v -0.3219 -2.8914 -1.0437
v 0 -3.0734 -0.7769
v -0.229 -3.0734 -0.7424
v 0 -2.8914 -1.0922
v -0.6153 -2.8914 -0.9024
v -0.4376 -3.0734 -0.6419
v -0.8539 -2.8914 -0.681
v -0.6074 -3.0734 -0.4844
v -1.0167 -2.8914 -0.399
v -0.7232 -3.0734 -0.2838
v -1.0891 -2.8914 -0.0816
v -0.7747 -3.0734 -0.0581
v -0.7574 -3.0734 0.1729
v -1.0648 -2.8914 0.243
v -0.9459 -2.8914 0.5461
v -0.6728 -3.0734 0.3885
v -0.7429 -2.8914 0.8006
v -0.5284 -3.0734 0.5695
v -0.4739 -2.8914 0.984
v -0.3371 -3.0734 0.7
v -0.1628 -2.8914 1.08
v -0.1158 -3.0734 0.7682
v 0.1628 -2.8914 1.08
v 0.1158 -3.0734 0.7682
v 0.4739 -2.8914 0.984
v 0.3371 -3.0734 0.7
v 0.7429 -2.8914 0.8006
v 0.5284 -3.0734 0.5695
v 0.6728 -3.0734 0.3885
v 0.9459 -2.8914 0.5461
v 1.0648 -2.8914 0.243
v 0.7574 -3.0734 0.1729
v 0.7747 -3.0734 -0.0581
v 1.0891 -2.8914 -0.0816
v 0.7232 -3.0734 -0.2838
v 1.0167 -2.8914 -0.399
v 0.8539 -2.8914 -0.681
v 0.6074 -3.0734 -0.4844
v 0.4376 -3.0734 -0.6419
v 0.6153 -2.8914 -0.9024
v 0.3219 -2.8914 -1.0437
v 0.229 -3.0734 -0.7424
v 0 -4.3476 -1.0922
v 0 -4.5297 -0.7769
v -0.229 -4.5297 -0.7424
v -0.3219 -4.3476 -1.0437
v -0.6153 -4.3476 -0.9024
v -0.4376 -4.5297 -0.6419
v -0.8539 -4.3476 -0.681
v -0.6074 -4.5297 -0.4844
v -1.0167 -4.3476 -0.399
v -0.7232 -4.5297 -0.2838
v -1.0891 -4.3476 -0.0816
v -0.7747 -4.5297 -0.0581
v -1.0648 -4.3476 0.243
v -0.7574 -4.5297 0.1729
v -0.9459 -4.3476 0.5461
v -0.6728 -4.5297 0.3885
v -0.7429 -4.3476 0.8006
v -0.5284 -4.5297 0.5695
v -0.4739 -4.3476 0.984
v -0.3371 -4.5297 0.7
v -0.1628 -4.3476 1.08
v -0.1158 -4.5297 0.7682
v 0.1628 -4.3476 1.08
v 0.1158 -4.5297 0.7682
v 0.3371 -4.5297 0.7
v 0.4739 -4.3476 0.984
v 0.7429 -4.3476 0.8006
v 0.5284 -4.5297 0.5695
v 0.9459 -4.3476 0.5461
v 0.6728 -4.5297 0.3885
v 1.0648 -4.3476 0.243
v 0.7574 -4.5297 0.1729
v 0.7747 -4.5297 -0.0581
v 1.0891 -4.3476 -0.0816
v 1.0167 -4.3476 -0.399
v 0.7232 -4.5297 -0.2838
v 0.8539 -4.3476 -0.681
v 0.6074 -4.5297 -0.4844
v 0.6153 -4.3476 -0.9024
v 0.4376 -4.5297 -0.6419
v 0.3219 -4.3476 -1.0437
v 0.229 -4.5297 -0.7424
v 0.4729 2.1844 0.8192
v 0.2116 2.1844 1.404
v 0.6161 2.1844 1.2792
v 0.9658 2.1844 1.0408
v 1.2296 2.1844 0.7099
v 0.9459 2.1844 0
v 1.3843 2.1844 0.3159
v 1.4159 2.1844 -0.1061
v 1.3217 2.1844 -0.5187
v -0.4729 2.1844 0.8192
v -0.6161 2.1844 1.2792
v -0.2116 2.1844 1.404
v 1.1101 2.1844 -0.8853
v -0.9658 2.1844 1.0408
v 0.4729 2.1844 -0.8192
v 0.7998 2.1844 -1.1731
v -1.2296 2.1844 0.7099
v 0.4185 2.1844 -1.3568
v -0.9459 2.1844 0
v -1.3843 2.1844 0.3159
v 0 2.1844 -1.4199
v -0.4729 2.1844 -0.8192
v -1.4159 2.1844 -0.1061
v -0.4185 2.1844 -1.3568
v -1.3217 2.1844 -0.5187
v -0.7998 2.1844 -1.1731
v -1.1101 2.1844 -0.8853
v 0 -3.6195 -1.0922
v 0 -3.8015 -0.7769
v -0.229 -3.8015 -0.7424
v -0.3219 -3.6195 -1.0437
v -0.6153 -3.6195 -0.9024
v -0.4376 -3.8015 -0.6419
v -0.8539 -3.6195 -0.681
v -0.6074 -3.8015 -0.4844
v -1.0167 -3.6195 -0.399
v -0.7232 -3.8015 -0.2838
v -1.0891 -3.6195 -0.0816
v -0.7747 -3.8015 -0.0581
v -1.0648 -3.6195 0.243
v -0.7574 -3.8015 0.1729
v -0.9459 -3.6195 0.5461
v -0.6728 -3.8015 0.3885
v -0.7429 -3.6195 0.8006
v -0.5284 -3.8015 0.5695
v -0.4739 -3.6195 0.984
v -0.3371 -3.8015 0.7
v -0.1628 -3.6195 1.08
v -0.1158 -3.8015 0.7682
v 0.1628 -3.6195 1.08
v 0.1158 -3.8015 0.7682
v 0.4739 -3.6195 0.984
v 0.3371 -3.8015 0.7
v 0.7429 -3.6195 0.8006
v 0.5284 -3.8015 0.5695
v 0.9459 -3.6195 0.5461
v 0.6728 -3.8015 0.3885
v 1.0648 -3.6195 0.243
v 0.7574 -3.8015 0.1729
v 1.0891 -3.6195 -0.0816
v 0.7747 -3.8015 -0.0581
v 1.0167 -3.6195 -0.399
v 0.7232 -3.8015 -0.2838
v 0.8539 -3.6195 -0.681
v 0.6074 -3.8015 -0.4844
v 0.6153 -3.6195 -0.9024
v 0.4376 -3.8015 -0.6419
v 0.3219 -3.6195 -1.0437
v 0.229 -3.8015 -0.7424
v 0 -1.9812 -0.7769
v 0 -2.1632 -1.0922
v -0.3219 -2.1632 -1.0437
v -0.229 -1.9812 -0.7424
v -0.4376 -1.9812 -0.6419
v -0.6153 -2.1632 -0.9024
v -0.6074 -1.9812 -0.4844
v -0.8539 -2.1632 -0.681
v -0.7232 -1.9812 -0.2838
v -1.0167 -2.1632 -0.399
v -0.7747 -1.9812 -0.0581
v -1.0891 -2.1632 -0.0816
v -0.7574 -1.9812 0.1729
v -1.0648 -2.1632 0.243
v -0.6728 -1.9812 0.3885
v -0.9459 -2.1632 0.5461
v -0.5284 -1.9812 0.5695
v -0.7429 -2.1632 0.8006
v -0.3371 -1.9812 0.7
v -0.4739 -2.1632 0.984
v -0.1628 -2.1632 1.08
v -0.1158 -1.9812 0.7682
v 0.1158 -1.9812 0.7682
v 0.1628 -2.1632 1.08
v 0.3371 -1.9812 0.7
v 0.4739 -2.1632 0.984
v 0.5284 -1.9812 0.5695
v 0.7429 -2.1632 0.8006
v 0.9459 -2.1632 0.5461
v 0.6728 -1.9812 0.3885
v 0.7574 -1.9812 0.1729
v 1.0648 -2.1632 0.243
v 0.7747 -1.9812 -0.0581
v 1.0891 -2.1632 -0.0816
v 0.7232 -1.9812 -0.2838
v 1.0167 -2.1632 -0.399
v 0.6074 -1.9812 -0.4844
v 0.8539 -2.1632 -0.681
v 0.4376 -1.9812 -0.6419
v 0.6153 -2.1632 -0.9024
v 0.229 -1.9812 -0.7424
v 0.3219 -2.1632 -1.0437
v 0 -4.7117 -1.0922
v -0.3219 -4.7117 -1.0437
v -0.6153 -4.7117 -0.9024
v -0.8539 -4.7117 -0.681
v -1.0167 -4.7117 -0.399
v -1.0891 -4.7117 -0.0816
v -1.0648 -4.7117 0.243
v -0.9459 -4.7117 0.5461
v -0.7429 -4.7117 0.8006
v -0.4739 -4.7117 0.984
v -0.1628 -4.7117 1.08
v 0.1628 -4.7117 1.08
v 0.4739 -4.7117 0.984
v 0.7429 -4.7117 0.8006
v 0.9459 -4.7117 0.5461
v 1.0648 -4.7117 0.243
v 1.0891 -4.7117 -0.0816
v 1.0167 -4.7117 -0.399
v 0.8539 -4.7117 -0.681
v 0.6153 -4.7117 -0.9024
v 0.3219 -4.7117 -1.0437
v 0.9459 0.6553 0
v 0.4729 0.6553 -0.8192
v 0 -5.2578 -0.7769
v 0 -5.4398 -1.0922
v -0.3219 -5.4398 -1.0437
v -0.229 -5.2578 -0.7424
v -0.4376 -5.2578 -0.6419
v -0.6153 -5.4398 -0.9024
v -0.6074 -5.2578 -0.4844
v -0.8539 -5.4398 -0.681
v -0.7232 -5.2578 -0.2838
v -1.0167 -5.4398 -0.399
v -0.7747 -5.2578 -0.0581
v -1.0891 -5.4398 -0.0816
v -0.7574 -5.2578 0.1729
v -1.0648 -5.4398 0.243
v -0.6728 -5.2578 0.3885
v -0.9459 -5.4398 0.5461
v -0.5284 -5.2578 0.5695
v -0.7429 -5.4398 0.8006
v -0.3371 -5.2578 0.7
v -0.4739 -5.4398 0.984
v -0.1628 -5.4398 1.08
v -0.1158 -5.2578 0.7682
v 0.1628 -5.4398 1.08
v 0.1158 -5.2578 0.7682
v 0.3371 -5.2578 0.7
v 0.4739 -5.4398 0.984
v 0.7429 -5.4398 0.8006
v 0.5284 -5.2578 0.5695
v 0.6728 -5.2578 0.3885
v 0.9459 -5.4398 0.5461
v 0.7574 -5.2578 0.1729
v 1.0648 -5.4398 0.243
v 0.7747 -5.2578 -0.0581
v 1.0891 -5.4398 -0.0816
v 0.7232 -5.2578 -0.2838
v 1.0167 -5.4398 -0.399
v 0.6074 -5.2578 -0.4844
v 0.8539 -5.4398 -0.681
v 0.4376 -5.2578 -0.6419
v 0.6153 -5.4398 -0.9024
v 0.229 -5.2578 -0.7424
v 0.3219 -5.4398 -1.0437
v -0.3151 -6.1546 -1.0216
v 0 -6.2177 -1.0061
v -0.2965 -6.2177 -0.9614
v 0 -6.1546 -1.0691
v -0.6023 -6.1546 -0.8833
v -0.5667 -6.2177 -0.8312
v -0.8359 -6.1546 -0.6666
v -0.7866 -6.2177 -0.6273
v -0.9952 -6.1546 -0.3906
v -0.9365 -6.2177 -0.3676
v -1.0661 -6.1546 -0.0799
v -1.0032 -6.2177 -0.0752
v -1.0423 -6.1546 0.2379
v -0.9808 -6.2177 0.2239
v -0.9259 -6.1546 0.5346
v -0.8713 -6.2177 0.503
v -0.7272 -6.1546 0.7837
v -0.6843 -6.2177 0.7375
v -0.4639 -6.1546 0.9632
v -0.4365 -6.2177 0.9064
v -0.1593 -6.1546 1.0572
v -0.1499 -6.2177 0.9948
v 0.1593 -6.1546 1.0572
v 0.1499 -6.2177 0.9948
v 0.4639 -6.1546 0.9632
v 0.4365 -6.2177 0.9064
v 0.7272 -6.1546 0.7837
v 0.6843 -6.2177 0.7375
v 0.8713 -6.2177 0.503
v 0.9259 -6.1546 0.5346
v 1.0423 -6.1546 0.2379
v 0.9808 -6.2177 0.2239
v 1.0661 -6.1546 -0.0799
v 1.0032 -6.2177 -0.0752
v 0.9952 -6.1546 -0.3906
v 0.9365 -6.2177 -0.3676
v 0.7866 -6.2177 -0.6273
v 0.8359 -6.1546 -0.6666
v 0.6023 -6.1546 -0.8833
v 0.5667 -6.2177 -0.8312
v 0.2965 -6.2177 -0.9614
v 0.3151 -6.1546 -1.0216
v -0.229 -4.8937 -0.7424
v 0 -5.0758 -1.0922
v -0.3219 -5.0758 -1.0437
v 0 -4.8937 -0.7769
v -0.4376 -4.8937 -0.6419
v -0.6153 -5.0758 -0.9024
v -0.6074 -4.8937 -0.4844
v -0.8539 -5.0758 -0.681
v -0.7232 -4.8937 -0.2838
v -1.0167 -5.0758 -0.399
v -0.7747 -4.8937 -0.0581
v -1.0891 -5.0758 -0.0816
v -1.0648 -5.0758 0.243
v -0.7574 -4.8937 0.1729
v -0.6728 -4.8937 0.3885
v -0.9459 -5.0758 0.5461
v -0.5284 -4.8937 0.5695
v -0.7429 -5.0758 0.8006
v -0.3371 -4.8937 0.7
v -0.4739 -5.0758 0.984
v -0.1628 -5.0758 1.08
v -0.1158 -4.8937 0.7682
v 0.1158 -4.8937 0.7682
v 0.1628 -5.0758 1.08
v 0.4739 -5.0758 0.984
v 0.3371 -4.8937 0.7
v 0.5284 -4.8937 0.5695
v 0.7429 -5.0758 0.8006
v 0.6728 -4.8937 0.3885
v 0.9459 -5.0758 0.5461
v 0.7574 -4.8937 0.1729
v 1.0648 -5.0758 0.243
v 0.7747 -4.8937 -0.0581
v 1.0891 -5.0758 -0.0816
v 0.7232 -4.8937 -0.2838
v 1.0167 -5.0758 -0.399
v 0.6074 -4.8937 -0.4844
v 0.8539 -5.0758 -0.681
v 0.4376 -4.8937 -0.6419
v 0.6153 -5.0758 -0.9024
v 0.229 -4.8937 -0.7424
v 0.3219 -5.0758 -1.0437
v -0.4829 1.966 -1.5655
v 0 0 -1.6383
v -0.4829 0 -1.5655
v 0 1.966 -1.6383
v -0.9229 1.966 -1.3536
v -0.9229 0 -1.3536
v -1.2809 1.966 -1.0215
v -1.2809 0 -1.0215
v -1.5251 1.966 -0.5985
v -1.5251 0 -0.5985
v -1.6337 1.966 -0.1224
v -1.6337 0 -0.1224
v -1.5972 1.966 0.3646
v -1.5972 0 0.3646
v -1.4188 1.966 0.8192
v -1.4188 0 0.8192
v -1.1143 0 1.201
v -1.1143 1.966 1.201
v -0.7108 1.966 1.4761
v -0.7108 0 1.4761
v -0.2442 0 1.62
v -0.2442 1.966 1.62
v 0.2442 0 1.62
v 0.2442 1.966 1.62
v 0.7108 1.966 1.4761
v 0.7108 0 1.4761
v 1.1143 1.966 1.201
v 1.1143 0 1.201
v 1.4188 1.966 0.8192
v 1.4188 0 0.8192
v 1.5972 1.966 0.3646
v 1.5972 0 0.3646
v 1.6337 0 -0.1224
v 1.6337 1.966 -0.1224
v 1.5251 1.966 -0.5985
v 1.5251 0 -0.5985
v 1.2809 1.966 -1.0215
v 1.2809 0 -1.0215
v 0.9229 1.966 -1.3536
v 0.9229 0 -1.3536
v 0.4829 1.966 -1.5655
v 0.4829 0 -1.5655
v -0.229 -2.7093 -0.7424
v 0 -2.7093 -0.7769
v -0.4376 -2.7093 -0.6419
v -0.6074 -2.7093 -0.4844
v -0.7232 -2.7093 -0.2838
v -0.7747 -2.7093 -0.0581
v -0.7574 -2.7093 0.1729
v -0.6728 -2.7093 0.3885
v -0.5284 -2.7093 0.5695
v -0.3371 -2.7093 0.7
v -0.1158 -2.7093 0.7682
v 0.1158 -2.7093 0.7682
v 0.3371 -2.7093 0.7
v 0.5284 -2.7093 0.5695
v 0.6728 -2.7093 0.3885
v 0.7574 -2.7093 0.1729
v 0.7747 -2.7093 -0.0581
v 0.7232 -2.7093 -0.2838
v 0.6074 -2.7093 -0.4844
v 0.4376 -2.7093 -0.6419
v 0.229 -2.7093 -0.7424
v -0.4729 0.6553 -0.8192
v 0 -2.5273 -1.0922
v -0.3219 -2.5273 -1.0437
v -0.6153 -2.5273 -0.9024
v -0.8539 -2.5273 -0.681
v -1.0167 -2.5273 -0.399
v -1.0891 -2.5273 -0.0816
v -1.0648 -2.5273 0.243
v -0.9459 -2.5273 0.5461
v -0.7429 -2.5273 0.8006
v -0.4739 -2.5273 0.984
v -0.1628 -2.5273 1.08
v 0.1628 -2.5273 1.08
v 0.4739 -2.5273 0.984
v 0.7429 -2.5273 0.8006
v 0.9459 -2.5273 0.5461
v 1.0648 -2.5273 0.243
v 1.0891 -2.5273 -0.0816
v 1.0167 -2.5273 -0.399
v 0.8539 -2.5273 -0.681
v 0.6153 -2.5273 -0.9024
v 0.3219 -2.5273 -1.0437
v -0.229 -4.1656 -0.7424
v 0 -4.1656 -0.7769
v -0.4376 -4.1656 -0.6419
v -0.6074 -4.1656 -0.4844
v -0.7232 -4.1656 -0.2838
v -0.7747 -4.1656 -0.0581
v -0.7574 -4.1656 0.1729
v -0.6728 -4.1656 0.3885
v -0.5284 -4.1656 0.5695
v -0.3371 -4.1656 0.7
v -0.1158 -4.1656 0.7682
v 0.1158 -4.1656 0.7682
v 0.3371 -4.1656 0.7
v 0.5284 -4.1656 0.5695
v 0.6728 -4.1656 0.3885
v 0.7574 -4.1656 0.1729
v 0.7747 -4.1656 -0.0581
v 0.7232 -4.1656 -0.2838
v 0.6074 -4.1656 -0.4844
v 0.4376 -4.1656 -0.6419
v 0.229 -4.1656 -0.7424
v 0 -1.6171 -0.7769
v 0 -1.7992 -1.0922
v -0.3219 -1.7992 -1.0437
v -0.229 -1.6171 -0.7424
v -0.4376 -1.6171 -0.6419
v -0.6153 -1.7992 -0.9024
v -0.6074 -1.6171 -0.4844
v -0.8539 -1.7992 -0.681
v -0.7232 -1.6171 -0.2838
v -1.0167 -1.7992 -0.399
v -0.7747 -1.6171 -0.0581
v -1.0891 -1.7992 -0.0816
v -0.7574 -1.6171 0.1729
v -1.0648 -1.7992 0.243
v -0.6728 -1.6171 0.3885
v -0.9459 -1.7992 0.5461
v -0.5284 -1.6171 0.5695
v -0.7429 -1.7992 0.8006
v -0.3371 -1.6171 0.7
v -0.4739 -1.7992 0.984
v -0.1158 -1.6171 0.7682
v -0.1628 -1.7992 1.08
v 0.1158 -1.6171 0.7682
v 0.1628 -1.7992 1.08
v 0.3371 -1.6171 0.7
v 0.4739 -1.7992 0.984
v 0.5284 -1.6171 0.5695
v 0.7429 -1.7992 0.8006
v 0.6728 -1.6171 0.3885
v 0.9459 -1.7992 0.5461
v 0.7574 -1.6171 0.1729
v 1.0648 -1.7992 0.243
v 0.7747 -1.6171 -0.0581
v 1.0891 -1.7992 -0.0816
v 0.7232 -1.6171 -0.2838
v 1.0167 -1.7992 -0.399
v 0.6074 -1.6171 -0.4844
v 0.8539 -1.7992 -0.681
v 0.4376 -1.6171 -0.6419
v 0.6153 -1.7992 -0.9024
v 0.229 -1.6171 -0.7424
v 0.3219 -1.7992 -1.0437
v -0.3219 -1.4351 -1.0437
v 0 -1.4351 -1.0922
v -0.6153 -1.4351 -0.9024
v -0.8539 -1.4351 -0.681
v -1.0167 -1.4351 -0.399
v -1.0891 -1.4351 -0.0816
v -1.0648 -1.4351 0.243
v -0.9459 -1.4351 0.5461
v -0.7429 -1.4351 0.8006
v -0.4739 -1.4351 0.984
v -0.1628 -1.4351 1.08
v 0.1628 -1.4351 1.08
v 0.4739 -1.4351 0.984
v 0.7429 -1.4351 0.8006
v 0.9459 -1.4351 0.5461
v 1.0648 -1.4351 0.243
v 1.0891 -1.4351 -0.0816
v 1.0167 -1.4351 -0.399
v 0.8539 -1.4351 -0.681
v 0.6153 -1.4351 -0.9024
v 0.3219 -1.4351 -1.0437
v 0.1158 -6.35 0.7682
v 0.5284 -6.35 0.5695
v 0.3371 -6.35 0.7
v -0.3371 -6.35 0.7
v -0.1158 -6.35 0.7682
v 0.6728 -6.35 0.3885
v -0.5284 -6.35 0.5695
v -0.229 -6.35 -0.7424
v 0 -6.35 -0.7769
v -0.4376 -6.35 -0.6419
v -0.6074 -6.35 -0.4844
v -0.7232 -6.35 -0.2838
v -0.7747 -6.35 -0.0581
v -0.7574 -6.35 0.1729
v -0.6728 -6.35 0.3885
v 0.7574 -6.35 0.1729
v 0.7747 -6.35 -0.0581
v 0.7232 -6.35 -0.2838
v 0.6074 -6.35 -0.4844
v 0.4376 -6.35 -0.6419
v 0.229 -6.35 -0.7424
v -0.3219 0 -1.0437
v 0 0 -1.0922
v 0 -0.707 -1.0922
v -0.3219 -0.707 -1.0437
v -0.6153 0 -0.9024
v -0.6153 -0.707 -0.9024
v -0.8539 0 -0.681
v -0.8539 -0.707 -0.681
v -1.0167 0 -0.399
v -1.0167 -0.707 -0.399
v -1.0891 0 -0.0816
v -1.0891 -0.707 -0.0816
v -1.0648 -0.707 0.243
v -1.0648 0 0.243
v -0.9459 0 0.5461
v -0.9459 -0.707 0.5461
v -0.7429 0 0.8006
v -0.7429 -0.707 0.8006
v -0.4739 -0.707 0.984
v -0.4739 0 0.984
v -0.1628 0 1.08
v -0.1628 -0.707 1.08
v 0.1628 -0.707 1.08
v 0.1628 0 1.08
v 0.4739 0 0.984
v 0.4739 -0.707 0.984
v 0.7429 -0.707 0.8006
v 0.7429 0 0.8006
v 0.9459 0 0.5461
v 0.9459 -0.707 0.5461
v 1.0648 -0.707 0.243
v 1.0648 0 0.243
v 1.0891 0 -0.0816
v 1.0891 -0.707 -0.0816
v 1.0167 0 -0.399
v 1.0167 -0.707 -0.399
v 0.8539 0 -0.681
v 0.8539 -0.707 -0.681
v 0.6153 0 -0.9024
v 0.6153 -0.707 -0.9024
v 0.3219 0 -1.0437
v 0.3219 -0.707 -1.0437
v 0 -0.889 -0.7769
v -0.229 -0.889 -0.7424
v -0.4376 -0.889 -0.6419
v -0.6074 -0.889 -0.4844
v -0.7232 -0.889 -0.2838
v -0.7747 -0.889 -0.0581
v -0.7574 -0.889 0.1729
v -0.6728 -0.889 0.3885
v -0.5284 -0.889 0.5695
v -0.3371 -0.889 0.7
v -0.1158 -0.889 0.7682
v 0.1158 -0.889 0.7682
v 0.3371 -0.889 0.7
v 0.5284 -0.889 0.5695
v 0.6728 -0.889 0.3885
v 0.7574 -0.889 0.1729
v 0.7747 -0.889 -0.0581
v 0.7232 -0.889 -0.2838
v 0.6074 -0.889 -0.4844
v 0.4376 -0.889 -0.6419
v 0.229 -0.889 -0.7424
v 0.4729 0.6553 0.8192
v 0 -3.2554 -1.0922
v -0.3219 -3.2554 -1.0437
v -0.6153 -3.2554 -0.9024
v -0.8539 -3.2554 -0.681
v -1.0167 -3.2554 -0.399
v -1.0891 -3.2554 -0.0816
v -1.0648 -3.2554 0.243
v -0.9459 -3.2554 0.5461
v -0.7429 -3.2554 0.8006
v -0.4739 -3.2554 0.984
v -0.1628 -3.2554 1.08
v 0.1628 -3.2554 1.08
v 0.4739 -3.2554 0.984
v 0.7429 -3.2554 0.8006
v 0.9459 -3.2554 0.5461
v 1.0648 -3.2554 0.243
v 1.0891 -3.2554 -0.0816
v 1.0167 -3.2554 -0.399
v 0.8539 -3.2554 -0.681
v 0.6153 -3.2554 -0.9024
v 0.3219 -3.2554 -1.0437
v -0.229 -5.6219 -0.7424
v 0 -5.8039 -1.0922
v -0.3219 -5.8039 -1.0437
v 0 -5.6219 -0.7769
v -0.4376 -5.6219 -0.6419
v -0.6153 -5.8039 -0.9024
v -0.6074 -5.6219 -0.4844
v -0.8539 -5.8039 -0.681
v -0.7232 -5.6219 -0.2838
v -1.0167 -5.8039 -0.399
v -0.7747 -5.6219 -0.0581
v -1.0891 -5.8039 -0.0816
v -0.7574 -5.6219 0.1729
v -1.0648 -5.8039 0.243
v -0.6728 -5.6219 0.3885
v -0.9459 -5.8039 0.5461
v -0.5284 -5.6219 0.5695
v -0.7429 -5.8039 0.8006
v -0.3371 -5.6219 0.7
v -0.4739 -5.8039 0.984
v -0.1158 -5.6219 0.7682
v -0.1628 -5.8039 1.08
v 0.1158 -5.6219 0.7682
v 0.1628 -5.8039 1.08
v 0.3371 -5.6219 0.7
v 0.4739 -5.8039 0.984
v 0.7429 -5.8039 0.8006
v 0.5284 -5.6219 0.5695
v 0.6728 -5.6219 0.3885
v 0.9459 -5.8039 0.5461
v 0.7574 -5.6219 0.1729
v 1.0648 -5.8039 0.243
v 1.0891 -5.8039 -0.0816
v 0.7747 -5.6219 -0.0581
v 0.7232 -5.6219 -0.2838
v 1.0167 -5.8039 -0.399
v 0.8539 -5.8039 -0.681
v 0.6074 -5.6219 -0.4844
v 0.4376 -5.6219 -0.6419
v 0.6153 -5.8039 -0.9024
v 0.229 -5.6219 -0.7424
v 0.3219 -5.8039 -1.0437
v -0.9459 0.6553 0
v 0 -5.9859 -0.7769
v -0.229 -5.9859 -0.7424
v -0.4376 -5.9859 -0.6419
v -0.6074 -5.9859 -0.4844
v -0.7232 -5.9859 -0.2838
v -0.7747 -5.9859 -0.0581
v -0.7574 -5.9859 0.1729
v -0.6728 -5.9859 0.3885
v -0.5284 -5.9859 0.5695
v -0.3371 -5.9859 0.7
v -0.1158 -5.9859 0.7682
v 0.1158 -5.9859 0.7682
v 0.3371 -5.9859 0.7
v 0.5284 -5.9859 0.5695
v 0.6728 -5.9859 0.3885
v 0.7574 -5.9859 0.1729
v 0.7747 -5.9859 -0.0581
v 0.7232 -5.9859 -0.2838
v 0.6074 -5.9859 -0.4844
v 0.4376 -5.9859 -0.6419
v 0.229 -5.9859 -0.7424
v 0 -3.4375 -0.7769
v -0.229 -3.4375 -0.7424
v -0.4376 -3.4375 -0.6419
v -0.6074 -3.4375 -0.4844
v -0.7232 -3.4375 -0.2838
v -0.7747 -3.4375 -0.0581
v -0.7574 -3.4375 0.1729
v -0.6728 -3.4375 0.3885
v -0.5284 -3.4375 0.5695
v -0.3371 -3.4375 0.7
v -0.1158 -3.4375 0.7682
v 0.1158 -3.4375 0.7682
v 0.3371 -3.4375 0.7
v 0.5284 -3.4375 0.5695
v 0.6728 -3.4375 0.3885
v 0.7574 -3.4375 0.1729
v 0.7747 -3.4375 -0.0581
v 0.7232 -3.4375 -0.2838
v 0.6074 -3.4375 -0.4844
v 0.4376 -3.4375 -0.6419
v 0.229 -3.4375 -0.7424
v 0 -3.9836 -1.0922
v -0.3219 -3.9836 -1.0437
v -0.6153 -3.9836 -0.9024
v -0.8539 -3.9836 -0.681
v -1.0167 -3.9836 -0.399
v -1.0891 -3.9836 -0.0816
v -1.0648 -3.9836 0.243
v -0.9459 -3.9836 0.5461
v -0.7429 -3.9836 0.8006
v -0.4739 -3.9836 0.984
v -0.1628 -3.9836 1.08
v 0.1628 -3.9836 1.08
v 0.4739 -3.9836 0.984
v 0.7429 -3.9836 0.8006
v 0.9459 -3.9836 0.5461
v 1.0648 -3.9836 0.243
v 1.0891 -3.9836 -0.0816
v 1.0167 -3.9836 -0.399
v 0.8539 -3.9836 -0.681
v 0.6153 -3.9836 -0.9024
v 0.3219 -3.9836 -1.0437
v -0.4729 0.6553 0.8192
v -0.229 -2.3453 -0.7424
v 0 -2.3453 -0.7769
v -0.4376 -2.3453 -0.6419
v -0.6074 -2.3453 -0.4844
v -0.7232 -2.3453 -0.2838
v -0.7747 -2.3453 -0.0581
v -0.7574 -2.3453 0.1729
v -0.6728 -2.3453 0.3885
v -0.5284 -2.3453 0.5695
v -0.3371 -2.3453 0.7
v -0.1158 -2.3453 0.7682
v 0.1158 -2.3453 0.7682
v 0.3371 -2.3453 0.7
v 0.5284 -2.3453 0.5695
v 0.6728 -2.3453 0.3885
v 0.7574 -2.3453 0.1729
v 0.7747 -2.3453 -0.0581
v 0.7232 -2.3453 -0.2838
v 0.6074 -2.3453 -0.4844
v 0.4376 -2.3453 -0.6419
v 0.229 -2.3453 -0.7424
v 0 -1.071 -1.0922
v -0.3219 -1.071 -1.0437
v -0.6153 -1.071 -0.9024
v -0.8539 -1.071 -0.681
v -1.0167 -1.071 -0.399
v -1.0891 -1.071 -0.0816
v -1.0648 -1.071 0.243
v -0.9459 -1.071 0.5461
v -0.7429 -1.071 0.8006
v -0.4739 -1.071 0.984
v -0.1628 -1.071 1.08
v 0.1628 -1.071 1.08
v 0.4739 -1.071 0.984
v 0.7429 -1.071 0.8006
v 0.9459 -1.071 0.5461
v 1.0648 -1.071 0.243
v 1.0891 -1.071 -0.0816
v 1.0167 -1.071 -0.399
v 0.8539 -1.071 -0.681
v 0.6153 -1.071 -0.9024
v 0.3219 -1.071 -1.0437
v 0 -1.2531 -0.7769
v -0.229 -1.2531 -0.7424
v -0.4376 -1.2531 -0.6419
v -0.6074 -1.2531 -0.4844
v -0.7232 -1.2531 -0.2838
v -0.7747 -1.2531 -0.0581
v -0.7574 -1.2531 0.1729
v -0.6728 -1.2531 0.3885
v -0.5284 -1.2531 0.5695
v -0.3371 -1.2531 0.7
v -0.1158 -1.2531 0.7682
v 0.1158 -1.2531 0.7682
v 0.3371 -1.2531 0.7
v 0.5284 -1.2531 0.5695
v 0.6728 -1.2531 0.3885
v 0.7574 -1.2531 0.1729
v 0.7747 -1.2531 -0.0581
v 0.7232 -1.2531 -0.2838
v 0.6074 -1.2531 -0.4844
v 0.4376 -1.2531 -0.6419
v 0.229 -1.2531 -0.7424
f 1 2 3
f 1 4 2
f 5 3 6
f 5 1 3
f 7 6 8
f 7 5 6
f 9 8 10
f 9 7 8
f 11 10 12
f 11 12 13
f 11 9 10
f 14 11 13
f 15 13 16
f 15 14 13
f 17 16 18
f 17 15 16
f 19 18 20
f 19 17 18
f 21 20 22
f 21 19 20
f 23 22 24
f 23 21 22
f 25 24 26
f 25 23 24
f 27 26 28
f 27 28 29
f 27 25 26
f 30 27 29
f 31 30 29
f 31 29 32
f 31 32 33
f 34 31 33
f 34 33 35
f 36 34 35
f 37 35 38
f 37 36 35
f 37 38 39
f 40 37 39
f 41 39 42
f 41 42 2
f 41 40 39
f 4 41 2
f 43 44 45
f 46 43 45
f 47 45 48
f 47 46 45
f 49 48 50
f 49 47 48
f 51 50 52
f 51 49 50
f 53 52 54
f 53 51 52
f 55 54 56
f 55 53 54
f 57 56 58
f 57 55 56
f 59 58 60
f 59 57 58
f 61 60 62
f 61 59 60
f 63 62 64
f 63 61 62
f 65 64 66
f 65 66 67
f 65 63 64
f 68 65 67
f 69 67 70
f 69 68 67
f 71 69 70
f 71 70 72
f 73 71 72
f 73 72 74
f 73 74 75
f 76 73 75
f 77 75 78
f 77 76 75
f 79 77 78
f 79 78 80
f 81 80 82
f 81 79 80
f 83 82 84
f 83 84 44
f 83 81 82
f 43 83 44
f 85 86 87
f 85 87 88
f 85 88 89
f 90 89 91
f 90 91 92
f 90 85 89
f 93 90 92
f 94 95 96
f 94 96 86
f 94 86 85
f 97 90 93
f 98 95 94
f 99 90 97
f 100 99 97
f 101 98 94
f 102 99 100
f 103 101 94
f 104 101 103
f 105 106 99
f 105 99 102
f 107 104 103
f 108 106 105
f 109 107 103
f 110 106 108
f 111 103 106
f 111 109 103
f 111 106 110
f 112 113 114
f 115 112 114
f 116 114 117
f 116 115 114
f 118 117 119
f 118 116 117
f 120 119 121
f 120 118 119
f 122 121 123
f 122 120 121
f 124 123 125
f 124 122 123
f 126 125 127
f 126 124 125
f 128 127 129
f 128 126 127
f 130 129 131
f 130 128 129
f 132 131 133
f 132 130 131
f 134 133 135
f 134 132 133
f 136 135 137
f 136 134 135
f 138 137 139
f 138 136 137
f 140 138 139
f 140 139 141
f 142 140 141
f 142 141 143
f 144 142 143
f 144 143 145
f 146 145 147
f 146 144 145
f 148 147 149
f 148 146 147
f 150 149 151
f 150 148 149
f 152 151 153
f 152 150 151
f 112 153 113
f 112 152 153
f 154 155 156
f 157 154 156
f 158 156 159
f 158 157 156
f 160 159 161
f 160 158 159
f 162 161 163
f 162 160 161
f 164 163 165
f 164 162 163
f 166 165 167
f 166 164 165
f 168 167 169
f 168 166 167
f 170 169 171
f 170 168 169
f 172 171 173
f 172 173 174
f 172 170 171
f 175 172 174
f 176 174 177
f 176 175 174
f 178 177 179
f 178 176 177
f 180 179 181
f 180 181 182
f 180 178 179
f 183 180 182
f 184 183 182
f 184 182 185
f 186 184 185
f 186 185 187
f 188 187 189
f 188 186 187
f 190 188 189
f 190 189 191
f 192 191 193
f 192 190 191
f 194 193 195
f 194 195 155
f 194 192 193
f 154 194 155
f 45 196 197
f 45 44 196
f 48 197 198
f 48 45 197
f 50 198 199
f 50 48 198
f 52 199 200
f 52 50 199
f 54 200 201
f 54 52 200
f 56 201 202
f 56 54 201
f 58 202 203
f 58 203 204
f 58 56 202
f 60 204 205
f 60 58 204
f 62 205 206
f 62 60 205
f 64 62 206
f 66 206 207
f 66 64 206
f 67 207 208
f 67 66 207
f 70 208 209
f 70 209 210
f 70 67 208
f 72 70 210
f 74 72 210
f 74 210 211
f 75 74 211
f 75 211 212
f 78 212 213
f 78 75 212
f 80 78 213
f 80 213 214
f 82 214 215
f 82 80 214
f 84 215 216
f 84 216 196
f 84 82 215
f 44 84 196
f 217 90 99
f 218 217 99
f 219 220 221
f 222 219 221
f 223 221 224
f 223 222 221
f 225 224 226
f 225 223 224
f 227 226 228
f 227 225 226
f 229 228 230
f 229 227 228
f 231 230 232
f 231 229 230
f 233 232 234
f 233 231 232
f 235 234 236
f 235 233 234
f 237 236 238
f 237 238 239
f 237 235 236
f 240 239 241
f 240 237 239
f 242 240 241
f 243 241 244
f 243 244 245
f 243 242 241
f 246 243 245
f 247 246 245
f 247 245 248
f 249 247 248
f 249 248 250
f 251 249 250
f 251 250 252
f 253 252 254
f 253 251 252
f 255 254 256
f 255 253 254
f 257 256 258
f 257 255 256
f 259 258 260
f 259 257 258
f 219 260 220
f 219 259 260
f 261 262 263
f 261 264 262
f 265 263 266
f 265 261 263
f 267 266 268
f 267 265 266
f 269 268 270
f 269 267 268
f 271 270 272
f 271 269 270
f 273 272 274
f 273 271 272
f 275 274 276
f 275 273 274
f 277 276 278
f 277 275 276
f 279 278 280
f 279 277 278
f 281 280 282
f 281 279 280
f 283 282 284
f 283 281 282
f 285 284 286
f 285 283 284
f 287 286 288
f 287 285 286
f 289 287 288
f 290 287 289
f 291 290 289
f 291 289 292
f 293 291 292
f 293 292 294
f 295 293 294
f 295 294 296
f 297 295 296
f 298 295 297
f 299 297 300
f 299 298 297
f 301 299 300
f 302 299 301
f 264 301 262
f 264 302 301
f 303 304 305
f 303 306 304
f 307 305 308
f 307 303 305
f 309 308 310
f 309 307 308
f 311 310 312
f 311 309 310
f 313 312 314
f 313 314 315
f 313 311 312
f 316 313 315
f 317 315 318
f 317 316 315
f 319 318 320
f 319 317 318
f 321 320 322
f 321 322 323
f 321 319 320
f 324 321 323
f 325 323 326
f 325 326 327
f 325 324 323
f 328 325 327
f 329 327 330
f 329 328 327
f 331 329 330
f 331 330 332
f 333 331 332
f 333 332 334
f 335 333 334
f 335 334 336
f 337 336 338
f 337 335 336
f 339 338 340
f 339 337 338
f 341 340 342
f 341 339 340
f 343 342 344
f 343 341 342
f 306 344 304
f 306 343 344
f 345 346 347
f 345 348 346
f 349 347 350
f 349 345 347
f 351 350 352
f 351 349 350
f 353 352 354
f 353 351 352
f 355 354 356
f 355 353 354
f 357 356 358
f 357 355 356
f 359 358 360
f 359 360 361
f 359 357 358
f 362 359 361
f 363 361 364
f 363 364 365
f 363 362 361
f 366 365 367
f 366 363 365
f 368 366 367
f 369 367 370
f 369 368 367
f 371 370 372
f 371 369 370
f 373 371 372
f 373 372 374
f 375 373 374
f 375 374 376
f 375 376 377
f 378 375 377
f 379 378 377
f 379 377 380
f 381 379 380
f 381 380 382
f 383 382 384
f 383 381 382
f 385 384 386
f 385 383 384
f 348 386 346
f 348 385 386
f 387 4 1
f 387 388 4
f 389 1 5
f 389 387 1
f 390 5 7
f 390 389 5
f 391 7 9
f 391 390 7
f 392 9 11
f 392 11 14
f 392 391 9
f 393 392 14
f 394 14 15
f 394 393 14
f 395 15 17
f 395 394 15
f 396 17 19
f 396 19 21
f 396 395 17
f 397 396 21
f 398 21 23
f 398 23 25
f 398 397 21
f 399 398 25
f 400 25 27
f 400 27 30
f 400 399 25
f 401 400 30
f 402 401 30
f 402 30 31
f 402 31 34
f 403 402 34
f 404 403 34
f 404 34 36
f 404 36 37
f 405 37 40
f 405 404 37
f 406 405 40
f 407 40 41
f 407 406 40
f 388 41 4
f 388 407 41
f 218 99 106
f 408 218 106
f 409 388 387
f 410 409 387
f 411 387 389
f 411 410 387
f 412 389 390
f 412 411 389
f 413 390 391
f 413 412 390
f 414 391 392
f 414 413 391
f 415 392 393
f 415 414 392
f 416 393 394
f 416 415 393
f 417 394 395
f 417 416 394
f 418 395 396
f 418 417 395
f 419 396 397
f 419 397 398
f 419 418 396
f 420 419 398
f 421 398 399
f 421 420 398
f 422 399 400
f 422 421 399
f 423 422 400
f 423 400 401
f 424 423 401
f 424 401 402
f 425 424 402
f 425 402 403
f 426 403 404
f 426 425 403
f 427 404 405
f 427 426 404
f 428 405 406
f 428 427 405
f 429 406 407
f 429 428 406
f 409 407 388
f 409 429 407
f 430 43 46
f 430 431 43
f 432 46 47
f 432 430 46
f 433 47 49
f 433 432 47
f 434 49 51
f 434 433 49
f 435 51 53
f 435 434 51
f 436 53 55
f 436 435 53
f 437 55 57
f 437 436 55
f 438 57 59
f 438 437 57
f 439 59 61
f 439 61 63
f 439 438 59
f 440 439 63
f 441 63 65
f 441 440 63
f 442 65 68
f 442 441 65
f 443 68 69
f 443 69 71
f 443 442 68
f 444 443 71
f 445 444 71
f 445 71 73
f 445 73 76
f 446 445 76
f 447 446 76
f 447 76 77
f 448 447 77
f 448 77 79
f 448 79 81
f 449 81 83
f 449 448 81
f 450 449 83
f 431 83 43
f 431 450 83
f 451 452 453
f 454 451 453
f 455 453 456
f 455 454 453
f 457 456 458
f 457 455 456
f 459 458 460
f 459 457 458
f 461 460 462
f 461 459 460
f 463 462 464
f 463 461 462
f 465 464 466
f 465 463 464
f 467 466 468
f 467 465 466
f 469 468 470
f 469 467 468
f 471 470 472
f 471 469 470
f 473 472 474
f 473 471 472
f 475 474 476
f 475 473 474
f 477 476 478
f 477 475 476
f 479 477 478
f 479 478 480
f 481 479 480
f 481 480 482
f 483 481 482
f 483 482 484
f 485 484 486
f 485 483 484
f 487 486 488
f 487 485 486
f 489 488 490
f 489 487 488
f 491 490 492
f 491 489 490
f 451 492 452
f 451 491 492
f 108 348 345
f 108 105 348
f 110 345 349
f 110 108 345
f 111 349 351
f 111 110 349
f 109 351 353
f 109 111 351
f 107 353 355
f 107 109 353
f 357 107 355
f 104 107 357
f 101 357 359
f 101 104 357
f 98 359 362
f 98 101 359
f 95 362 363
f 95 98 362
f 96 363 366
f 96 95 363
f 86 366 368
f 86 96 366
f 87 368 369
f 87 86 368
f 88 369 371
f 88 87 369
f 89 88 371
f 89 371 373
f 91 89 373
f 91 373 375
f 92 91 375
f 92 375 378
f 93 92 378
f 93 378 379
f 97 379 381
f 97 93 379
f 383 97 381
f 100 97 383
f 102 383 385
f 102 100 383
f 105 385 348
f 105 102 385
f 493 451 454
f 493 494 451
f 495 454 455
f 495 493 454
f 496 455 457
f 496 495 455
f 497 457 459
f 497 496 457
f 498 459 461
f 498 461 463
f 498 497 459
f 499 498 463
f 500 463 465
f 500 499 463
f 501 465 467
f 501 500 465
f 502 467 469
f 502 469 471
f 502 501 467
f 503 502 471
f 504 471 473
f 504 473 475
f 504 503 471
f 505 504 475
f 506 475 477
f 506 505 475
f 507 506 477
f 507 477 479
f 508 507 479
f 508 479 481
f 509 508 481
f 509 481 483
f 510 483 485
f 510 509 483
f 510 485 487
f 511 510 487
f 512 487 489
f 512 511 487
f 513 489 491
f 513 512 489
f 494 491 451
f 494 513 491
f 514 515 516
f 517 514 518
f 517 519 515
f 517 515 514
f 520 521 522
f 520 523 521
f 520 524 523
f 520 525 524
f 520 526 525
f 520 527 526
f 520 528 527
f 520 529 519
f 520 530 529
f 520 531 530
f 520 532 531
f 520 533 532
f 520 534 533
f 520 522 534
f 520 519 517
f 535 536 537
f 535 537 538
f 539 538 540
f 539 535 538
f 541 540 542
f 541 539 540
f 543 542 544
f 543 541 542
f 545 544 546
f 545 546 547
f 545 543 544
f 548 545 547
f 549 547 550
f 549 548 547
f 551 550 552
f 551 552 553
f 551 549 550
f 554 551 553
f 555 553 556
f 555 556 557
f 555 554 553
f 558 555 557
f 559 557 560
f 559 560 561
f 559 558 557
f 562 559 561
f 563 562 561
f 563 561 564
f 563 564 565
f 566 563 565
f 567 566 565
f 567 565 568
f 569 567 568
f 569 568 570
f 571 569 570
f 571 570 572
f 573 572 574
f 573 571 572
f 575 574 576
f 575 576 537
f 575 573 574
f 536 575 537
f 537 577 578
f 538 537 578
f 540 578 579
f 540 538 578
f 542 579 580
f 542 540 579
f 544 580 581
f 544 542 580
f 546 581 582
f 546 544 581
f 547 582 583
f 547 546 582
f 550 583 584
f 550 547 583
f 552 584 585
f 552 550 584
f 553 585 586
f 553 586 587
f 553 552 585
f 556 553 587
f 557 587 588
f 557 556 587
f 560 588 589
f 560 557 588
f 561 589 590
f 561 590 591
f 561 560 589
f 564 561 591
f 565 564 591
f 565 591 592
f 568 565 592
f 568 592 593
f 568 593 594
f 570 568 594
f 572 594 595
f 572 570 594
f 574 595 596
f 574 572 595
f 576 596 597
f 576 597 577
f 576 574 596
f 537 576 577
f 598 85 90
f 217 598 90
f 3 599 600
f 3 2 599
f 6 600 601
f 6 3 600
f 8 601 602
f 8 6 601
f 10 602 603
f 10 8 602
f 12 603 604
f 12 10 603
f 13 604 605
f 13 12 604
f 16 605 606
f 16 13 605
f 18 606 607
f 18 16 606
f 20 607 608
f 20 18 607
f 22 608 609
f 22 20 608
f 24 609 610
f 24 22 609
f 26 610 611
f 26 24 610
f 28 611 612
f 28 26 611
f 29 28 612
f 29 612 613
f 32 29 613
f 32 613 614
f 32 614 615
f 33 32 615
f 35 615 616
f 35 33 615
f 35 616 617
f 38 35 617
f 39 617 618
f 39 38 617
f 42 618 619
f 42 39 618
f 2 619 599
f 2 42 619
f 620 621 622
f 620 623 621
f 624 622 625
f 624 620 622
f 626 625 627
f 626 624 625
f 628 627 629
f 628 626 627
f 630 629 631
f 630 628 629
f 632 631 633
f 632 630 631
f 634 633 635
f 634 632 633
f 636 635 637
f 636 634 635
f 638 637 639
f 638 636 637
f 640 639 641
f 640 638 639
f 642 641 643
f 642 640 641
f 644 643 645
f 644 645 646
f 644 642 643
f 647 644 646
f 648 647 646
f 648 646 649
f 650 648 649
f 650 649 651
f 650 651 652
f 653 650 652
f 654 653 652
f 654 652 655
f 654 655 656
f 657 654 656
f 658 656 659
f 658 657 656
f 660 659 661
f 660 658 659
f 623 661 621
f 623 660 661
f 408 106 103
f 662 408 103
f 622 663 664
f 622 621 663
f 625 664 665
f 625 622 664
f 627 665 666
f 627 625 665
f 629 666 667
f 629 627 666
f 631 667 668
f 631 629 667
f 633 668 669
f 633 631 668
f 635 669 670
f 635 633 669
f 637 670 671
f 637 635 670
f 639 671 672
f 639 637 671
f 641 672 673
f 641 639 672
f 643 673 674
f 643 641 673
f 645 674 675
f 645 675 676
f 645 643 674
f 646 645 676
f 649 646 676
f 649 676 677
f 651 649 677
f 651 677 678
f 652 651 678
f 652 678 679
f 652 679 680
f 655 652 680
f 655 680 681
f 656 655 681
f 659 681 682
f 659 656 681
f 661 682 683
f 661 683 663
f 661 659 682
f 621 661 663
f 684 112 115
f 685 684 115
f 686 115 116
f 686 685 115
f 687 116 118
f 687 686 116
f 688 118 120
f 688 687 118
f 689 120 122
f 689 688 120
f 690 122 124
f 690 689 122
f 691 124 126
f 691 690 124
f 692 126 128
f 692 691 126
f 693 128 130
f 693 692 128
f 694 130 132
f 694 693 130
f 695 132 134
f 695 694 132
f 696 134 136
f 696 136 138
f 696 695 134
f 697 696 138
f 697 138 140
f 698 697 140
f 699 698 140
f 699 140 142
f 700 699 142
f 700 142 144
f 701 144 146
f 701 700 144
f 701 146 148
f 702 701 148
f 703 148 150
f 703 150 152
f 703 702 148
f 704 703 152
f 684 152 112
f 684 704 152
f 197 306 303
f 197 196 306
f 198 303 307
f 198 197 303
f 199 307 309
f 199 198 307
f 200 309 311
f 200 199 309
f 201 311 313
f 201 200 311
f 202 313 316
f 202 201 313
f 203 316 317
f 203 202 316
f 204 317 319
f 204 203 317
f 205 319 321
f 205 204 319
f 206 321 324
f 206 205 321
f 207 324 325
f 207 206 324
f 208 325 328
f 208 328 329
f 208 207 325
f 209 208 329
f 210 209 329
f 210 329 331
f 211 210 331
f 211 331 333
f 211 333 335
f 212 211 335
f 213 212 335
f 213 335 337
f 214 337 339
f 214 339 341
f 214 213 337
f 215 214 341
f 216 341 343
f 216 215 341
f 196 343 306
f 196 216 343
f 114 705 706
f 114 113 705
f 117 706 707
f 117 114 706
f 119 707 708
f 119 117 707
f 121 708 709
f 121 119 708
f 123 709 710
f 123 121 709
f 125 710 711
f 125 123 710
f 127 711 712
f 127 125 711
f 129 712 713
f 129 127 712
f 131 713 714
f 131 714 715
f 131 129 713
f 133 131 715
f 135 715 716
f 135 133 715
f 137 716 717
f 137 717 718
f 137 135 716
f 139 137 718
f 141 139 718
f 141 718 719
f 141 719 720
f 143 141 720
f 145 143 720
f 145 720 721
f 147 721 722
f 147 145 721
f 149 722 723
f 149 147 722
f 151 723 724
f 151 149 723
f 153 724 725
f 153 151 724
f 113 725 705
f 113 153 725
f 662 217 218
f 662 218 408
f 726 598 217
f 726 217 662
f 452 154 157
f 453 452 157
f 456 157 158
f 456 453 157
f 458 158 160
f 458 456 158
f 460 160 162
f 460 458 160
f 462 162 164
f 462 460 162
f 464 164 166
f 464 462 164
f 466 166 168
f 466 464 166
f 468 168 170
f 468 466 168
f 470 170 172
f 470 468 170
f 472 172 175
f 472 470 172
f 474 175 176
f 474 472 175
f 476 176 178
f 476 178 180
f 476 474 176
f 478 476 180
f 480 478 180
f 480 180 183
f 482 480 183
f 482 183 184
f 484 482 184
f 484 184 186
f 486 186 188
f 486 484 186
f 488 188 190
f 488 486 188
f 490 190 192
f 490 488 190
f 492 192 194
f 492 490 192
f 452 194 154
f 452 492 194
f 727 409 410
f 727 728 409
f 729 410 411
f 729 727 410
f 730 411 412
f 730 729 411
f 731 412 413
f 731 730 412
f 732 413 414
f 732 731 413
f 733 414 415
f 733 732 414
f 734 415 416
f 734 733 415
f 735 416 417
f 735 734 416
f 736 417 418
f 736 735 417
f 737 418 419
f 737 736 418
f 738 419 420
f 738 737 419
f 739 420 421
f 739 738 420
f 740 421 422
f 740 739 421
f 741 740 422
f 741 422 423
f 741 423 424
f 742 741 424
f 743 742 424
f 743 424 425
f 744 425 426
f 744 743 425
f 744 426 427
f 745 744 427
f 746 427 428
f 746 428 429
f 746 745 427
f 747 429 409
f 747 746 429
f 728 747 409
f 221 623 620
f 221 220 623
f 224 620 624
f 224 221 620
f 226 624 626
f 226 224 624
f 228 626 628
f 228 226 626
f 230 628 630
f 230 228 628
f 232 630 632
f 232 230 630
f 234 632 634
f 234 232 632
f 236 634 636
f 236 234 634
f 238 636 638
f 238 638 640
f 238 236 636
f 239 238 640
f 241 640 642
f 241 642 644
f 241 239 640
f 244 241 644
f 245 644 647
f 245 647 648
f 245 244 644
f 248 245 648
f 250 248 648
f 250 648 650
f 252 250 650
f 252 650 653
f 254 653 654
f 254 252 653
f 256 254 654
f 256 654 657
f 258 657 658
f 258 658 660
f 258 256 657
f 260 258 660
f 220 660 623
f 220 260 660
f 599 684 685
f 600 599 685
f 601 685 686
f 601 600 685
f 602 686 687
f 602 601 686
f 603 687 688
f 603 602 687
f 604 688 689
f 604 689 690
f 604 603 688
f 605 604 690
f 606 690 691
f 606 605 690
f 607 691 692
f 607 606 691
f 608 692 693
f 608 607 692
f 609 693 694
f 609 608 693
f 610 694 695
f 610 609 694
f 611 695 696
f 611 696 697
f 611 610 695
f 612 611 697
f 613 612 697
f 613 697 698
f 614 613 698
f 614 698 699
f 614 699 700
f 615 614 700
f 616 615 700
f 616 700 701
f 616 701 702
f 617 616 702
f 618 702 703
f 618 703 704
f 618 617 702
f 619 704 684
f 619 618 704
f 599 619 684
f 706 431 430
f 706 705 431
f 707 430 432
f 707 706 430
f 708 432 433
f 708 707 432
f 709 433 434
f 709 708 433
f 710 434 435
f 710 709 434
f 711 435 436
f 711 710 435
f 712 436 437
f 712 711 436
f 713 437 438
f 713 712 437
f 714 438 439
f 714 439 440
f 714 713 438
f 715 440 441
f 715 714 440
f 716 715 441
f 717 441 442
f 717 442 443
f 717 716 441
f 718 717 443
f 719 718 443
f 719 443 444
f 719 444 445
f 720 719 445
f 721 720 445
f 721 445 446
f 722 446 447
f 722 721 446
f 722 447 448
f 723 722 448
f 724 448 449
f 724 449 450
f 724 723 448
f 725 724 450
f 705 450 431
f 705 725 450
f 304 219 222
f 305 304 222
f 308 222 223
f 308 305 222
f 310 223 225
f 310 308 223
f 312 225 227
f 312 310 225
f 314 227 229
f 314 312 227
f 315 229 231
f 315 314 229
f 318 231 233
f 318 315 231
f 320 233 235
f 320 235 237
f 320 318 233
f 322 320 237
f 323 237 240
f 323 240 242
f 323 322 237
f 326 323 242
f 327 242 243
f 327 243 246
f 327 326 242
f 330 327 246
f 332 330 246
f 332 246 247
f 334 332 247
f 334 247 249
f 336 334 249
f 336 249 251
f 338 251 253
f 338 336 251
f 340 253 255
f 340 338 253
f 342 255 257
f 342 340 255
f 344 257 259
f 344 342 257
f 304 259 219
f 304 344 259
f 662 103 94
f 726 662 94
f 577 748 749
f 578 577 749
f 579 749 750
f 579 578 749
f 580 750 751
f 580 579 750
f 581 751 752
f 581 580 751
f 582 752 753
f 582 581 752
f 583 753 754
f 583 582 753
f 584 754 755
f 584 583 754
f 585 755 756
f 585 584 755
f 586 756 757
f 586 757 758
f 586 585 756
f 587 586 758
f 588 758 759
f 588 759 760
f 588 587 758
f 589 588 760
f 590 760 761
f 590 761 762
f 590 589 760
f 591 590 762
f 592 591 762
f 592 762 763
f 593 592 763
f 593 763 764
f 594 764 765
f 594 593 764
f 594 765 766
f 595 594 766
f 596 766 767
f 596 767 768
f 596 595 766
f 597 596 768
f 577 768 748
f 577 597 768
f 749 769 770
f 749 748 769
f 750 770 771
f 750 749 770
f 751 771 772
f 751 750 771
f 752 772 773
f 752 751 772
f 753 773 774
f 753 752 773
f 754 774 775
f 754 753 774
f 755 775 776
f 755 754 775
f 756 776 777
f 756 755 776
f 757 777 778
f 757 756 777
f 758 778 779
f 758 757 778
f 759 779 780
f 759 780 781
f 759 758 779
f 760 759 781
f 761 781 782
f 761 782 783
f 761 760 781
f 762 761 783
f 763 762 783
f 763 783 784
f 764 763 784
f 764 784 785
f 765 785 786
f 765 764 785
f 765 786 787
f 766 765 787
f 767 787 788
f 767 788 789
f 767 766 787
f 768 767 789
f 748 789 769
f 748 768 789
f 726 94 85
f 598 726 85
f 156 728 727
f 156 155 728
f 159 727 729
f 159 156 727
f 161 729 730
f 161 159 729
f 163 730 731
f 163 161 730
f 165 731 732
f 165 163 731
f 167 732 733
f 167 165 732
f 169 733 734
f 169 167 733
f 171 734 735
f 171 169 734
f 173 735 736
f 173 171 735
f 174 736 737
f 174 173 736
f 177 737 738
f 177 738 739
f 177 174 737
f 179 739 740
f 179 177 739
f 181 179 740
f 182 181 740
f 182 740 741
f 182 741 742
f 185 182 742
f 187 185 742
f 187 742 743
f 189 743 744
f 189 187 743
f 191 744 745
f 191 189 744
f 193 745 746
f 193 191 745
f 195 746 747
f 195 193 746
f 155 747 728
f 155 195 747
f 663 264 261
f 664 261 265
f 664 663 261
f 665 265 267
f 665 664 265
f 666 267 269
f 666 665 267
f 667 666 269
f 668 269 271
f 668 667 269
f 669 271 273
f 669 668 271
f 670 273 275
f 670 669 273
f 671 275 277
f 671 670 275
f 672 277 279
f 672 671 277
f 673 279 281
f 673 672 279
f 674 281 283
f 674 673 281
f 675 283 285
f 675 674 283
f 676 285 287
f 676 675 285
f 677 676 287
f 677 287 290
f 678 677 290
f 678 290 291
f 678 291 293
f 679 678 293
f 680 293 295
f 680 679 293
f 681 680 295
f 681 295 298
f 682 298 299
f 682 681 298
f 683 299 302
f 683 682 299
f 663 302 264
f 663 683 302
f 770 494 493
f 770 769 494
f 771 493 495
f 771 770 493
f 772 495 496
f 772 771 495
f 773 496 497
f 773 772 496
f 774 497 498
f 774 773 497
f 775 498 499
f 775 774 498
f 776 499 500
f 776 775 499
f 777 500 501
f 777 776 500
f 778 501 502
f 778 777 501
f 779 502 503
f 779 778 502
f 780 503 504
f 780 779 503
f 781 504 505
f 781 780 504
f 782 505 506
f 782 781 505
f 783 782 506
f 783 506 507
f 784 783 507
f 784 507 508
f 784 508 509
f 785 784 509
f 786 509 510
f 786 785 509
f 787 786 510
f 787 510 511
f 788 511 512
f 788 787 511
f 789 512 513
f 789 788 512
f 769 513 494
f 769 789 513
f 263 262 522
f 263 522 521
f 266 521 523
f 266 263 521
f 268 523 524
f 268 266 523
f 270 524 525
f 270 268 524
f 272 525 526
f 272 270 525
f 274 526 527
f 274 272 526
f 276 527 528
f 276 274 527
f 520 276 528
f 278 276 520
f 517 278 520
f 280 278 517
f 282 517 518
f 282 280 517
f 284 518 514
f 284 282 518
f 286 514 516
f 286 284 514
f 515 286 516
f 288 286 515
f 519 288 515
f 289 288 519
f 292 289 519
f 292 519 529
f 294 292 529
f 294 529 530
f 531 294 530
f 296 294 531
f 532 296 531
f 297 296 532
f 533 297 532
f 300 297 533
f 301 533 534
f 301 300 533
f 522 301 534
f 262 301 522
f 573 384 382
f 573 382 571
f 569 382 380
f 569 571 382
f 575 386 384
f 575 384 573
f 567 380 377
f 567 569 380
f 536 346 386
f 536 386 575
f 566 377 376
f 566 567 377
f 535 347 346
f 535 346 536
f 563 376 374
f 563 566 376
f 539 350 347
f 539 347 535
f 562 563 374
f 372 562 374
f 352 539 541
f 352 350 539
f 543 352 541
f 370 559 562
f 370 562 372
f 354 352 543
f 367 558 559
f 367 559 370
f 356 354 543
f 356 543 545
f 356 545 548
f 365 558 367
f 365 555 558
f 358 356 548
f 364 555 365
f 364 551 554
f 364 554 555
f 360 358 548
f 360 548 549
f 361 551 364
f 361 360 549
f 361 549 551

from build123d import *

# Parameters (mm, degrees)
HEX_CUT_DRIVEN_DEPTH = 1.52908


with BuildPart() as part:
    # Sketch3 → Shank Revolve ( driven ) (revolve)
    with BuildSketch(Plane.XY, mode=Mode.PRIVATE) as shank_revolve_driven_sk:
        Polygon((0, 0.65532), (0, -6.35), (0.87376, -6.35), (1.0922, -6.13156), (1.0922, 0.65532), align=None)
    revolve(shank_revolve_driven_sk.sketch.rotate(Axis((0, -50, 0), (0, 1, 0)), 90), axis=Axis((0, -50, 0), (0, 1, 0)))

    # Sketch4 → Thread Revolve Cut ( driven ) (revolve, cut)
    with BuildSketch(Plane.XY, mode=Mode.PRIVATE) as thread_revolve_cut_driven_sk:
        Polygon((0.776909018, -0.889), (1.0922, -0.706966667), (1.633740037, -0.706966667), (1.633740037, -7.260166667), (1.0922, -7.260166667), (0.776909018, -7.078133333), (1.0922, -6.8961), (0.776909018, -6.714066667), (1.0922, -6.532033333), (0.776909018, -6.35), (1.0922, -6.167966667), (0.776909018, -5.985933333), (1.0922, -5.8039), (0.776909018, -5.621866667), (1.0922, -5.439833333), (0.776909018, -5.2578), (1.0922, -5.075766667), (0.776909018, -4.893733333), (1.0922, -4.7117), (0.776909018, -4.529666667), (1.0922, -4.347633333), (0.776909018, -4.1656), (1.0922, -3.983566667), (0.776909018, -3.801533333), (1.0922, -3.6195), (0.776909018, -3.437466667), (1.0922, -3.255433333), (0.776909018, -3.0734), (1.0922, -2.891366667), (0.776909018, -2.709333333), (1.0922, -2.5273), (0.776909018, -2.345266667), (1.0922, -2.163233333), (0.776909018, -1.9812), (1.0922, -1.799166667), (0.776909018, -1.617133333), (1.0922, -1.4351), (0.776909018, -1.253066667), (1.0922, -1.071033333), align=None)
    revolve(thread_revolve_cut_driven_sk.sketch.rotate(Axis((0, -50, 0), (0, 1, 0)), 90), axis=Axis((0, -50, 0), (0, 1, 0)), mode=Mode.SUBTRACT)

    # Sketch5 → Head Revolve ( driven ) (revolve)
    with BuildSketch(Plane.XY, mode=Mode.PRIVATE) as head_revolve_driven_sk:
        Polygon((0, 2.1844), (0, 0), (1.6383, 0), (1.6383, 1.96596), (1.41986, 2.1844), align=None)
    revolve(head_revolve_driven_sk.sketch.rotate(Axis((0, -50, 0), (0, 1, 0)), 90), axis=Axis((0, -50, 0), (0, 1, 0)))

    # Sketch2 → Hex Cut ( driven ) (cut)
    with BuildSketch(Plane(origin=(0, 2.1844, 0), x_dir=(-1, 0, 0), z_dir=(0, 1, 0))):
        Polygon((-0.945872946, 0), (-0.472936473, -0.81915), (0.472936473, -0.81915), (0.945872946, 0), (0.472936473, 0.81915), (-0.472936473, 0.81915), align=None)
    extrude(amount=-HEX_CUT_DRIVEN_DEPTH, mode=Mode.SUBTRACT)


solid = part.part
